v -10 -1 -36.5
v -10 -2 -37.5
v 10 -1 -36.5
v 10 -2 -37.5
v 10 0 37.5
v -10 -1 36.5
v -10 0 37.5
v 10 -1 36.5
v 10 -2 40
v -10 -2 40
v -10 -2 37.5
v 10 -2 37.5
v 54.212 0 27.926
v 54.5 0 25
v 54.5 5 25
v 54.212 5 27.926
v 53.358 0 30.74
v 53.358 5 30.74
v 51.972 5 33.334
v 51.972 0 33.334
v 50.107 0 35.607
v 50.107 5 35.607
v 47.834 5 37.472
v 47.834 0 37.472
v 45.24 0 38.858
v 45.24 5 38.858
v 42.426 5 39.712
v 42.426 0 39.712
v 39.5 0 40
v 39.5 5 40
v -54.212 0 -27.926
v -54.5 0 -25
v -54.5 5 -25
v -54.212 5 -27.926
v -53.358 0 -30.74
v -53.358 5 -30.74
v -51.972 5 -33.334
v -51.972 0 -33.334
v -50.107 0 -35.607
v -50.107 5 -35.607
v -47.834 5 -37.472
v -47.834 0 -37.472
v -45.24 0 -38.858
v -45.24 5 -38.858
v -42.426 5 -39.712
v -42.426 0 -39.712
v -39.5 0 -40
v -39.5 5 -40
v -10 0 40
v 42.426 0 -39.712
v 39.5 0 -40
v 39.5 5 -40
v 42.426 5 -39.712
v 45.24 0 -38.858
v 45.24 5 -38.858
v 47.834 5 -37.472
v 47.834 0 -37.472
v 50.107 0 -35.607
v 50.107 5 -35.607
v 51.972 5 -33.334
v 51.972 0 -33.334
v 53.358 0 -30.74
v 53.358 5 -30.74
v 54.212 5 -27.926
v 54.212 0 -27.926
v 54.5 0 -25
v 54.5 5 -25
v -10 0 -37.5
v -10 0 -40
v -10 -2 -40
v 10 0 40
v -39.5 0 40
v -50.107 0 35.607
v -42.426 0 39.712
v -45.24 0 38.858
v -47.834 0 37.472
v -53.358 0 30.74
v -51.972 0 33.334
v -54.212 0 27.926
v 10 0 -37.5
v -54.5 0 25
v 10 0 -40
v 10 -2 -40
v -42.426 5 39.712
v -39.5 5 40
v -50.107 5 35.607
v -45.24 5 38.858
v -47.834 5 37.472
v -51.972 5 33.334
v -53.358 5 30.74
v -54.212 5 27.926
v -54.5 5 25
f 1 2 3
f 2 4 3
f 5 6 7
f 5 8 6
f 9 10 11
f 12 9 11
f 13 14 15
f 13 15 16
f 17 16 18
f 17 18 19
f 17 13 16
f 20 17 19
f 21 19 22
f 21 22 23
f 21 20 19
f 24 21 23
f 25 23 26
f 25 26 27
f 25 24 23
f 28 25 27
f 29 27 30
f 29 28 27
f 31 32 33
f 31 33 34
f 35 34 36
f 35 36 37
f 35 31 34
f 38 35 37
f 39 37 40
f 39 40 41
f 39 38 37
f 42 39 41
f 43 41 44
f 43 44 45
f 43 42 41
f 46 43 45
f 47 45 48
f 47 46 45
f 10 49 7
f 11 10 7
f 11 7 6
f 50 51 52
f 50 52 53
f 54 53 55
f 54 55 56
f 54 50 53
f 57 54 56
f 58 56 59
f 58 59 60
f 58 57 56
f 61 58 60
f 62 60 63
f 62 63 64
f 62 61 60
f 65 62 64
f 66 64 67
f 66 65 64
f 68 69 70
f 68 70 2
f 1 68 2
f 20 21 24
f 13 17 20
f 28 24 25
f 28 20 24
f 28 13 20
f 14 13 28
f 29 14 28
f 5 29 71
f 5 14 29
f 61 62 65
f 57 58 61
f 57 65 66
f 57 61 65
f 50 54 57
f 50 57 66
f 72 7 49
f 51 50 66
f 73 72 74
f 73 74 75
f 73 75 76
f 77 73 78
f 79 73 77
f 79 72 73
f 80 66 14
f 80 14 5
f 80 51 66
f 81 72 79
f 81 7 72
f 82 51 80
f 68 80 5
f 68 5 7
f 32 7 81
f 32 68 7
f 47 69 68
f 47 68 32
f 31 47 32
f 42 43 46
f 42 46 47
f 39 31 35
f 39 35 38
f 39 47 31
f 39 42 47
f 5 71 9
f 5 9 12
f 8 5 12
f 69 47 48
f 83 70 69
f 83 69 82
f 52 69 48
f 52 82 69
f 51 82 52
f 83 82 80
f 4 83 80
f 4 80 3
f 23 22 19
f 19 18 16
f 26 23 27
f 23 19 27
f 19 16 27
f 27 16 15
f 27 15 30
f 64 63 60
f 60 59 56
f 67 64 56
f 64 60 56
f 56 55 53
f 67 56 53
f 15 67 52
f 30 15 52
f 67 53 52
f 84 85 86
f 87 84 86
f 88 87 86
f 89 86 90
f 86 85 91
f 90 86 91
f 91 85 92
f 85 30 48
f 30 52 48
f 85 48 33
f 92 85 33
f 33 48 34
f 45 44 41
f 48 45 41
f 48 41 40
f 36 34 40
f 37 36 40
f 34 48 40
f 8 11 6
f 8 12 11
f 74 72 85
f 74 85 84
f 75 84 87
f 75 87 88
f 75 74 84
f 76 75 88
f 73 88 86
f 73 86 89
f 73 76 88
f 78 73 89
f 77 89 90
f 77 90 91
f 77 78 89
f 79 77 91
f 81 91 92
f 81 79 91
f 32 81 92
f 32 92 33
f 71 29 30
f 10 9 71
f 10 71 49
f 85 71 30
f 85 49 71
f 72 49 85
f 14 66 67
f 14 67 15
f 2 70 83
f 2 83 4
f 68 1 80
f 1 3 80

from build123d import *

# Parameters (mm, degrees)
BOSS_EXTRUDE1_DEPTH = 5
BOSS_EXTRUDE2_DEPTH = 10


with BuildPart() as part:
    # Sketch1 → Boss-Extrude1 (new body)
    with BuildSketch(Plane(origin=(0, 0, 0), x_dir=(1, 0, 0), z_dir=(0, 1, 0))):
        with BuildLine():
            Line((-39.5, 40), (39.5, 40))
            ThreePointArc((39.5, 40), (50.106601718, 35.606601718), (54.5, 25))
            Line((54.5, 25), (54.5, -25))
            ThreePointArc((54.5, -25), (50.106601718, -35.606601718), (39.5, -40))
            Line((39.5, -40), (-39.5, -40))
            ThreePointArc((-39.5, -40), (-50.106601718, -35.606601718), (-54.5, -25))
            Line((-54.5, -25), (-54.5, 25))
            ThreePointArc((-54.5, 25), (-50.106601718, 35.606601718), (-39.5, 40))
        make_face()
    extrude(amount=BOSS_EXTRUDE1_DEPTH)

    # Sketch2 → Boss-Extrude2 (add, symmetric)
    with BuildSketch(Plane(origin=(0, 0, 0), x_dir=(0, 0, -1), z_dir=(1, 0, 0))):
        Polygon((-37.5, 0), (-40, 0), (-40, -2), (-37.5, -2), (-36.5, -1), align=None)
    boss_extrude2 = extrude(amount=BOSS_EXTRUDE2_DEPTH, both=True)

    # Mirror1: Boss-Extrude2 across plane
    add(boss_extrude2.mirror(Plane.XY))


solid = part.part
